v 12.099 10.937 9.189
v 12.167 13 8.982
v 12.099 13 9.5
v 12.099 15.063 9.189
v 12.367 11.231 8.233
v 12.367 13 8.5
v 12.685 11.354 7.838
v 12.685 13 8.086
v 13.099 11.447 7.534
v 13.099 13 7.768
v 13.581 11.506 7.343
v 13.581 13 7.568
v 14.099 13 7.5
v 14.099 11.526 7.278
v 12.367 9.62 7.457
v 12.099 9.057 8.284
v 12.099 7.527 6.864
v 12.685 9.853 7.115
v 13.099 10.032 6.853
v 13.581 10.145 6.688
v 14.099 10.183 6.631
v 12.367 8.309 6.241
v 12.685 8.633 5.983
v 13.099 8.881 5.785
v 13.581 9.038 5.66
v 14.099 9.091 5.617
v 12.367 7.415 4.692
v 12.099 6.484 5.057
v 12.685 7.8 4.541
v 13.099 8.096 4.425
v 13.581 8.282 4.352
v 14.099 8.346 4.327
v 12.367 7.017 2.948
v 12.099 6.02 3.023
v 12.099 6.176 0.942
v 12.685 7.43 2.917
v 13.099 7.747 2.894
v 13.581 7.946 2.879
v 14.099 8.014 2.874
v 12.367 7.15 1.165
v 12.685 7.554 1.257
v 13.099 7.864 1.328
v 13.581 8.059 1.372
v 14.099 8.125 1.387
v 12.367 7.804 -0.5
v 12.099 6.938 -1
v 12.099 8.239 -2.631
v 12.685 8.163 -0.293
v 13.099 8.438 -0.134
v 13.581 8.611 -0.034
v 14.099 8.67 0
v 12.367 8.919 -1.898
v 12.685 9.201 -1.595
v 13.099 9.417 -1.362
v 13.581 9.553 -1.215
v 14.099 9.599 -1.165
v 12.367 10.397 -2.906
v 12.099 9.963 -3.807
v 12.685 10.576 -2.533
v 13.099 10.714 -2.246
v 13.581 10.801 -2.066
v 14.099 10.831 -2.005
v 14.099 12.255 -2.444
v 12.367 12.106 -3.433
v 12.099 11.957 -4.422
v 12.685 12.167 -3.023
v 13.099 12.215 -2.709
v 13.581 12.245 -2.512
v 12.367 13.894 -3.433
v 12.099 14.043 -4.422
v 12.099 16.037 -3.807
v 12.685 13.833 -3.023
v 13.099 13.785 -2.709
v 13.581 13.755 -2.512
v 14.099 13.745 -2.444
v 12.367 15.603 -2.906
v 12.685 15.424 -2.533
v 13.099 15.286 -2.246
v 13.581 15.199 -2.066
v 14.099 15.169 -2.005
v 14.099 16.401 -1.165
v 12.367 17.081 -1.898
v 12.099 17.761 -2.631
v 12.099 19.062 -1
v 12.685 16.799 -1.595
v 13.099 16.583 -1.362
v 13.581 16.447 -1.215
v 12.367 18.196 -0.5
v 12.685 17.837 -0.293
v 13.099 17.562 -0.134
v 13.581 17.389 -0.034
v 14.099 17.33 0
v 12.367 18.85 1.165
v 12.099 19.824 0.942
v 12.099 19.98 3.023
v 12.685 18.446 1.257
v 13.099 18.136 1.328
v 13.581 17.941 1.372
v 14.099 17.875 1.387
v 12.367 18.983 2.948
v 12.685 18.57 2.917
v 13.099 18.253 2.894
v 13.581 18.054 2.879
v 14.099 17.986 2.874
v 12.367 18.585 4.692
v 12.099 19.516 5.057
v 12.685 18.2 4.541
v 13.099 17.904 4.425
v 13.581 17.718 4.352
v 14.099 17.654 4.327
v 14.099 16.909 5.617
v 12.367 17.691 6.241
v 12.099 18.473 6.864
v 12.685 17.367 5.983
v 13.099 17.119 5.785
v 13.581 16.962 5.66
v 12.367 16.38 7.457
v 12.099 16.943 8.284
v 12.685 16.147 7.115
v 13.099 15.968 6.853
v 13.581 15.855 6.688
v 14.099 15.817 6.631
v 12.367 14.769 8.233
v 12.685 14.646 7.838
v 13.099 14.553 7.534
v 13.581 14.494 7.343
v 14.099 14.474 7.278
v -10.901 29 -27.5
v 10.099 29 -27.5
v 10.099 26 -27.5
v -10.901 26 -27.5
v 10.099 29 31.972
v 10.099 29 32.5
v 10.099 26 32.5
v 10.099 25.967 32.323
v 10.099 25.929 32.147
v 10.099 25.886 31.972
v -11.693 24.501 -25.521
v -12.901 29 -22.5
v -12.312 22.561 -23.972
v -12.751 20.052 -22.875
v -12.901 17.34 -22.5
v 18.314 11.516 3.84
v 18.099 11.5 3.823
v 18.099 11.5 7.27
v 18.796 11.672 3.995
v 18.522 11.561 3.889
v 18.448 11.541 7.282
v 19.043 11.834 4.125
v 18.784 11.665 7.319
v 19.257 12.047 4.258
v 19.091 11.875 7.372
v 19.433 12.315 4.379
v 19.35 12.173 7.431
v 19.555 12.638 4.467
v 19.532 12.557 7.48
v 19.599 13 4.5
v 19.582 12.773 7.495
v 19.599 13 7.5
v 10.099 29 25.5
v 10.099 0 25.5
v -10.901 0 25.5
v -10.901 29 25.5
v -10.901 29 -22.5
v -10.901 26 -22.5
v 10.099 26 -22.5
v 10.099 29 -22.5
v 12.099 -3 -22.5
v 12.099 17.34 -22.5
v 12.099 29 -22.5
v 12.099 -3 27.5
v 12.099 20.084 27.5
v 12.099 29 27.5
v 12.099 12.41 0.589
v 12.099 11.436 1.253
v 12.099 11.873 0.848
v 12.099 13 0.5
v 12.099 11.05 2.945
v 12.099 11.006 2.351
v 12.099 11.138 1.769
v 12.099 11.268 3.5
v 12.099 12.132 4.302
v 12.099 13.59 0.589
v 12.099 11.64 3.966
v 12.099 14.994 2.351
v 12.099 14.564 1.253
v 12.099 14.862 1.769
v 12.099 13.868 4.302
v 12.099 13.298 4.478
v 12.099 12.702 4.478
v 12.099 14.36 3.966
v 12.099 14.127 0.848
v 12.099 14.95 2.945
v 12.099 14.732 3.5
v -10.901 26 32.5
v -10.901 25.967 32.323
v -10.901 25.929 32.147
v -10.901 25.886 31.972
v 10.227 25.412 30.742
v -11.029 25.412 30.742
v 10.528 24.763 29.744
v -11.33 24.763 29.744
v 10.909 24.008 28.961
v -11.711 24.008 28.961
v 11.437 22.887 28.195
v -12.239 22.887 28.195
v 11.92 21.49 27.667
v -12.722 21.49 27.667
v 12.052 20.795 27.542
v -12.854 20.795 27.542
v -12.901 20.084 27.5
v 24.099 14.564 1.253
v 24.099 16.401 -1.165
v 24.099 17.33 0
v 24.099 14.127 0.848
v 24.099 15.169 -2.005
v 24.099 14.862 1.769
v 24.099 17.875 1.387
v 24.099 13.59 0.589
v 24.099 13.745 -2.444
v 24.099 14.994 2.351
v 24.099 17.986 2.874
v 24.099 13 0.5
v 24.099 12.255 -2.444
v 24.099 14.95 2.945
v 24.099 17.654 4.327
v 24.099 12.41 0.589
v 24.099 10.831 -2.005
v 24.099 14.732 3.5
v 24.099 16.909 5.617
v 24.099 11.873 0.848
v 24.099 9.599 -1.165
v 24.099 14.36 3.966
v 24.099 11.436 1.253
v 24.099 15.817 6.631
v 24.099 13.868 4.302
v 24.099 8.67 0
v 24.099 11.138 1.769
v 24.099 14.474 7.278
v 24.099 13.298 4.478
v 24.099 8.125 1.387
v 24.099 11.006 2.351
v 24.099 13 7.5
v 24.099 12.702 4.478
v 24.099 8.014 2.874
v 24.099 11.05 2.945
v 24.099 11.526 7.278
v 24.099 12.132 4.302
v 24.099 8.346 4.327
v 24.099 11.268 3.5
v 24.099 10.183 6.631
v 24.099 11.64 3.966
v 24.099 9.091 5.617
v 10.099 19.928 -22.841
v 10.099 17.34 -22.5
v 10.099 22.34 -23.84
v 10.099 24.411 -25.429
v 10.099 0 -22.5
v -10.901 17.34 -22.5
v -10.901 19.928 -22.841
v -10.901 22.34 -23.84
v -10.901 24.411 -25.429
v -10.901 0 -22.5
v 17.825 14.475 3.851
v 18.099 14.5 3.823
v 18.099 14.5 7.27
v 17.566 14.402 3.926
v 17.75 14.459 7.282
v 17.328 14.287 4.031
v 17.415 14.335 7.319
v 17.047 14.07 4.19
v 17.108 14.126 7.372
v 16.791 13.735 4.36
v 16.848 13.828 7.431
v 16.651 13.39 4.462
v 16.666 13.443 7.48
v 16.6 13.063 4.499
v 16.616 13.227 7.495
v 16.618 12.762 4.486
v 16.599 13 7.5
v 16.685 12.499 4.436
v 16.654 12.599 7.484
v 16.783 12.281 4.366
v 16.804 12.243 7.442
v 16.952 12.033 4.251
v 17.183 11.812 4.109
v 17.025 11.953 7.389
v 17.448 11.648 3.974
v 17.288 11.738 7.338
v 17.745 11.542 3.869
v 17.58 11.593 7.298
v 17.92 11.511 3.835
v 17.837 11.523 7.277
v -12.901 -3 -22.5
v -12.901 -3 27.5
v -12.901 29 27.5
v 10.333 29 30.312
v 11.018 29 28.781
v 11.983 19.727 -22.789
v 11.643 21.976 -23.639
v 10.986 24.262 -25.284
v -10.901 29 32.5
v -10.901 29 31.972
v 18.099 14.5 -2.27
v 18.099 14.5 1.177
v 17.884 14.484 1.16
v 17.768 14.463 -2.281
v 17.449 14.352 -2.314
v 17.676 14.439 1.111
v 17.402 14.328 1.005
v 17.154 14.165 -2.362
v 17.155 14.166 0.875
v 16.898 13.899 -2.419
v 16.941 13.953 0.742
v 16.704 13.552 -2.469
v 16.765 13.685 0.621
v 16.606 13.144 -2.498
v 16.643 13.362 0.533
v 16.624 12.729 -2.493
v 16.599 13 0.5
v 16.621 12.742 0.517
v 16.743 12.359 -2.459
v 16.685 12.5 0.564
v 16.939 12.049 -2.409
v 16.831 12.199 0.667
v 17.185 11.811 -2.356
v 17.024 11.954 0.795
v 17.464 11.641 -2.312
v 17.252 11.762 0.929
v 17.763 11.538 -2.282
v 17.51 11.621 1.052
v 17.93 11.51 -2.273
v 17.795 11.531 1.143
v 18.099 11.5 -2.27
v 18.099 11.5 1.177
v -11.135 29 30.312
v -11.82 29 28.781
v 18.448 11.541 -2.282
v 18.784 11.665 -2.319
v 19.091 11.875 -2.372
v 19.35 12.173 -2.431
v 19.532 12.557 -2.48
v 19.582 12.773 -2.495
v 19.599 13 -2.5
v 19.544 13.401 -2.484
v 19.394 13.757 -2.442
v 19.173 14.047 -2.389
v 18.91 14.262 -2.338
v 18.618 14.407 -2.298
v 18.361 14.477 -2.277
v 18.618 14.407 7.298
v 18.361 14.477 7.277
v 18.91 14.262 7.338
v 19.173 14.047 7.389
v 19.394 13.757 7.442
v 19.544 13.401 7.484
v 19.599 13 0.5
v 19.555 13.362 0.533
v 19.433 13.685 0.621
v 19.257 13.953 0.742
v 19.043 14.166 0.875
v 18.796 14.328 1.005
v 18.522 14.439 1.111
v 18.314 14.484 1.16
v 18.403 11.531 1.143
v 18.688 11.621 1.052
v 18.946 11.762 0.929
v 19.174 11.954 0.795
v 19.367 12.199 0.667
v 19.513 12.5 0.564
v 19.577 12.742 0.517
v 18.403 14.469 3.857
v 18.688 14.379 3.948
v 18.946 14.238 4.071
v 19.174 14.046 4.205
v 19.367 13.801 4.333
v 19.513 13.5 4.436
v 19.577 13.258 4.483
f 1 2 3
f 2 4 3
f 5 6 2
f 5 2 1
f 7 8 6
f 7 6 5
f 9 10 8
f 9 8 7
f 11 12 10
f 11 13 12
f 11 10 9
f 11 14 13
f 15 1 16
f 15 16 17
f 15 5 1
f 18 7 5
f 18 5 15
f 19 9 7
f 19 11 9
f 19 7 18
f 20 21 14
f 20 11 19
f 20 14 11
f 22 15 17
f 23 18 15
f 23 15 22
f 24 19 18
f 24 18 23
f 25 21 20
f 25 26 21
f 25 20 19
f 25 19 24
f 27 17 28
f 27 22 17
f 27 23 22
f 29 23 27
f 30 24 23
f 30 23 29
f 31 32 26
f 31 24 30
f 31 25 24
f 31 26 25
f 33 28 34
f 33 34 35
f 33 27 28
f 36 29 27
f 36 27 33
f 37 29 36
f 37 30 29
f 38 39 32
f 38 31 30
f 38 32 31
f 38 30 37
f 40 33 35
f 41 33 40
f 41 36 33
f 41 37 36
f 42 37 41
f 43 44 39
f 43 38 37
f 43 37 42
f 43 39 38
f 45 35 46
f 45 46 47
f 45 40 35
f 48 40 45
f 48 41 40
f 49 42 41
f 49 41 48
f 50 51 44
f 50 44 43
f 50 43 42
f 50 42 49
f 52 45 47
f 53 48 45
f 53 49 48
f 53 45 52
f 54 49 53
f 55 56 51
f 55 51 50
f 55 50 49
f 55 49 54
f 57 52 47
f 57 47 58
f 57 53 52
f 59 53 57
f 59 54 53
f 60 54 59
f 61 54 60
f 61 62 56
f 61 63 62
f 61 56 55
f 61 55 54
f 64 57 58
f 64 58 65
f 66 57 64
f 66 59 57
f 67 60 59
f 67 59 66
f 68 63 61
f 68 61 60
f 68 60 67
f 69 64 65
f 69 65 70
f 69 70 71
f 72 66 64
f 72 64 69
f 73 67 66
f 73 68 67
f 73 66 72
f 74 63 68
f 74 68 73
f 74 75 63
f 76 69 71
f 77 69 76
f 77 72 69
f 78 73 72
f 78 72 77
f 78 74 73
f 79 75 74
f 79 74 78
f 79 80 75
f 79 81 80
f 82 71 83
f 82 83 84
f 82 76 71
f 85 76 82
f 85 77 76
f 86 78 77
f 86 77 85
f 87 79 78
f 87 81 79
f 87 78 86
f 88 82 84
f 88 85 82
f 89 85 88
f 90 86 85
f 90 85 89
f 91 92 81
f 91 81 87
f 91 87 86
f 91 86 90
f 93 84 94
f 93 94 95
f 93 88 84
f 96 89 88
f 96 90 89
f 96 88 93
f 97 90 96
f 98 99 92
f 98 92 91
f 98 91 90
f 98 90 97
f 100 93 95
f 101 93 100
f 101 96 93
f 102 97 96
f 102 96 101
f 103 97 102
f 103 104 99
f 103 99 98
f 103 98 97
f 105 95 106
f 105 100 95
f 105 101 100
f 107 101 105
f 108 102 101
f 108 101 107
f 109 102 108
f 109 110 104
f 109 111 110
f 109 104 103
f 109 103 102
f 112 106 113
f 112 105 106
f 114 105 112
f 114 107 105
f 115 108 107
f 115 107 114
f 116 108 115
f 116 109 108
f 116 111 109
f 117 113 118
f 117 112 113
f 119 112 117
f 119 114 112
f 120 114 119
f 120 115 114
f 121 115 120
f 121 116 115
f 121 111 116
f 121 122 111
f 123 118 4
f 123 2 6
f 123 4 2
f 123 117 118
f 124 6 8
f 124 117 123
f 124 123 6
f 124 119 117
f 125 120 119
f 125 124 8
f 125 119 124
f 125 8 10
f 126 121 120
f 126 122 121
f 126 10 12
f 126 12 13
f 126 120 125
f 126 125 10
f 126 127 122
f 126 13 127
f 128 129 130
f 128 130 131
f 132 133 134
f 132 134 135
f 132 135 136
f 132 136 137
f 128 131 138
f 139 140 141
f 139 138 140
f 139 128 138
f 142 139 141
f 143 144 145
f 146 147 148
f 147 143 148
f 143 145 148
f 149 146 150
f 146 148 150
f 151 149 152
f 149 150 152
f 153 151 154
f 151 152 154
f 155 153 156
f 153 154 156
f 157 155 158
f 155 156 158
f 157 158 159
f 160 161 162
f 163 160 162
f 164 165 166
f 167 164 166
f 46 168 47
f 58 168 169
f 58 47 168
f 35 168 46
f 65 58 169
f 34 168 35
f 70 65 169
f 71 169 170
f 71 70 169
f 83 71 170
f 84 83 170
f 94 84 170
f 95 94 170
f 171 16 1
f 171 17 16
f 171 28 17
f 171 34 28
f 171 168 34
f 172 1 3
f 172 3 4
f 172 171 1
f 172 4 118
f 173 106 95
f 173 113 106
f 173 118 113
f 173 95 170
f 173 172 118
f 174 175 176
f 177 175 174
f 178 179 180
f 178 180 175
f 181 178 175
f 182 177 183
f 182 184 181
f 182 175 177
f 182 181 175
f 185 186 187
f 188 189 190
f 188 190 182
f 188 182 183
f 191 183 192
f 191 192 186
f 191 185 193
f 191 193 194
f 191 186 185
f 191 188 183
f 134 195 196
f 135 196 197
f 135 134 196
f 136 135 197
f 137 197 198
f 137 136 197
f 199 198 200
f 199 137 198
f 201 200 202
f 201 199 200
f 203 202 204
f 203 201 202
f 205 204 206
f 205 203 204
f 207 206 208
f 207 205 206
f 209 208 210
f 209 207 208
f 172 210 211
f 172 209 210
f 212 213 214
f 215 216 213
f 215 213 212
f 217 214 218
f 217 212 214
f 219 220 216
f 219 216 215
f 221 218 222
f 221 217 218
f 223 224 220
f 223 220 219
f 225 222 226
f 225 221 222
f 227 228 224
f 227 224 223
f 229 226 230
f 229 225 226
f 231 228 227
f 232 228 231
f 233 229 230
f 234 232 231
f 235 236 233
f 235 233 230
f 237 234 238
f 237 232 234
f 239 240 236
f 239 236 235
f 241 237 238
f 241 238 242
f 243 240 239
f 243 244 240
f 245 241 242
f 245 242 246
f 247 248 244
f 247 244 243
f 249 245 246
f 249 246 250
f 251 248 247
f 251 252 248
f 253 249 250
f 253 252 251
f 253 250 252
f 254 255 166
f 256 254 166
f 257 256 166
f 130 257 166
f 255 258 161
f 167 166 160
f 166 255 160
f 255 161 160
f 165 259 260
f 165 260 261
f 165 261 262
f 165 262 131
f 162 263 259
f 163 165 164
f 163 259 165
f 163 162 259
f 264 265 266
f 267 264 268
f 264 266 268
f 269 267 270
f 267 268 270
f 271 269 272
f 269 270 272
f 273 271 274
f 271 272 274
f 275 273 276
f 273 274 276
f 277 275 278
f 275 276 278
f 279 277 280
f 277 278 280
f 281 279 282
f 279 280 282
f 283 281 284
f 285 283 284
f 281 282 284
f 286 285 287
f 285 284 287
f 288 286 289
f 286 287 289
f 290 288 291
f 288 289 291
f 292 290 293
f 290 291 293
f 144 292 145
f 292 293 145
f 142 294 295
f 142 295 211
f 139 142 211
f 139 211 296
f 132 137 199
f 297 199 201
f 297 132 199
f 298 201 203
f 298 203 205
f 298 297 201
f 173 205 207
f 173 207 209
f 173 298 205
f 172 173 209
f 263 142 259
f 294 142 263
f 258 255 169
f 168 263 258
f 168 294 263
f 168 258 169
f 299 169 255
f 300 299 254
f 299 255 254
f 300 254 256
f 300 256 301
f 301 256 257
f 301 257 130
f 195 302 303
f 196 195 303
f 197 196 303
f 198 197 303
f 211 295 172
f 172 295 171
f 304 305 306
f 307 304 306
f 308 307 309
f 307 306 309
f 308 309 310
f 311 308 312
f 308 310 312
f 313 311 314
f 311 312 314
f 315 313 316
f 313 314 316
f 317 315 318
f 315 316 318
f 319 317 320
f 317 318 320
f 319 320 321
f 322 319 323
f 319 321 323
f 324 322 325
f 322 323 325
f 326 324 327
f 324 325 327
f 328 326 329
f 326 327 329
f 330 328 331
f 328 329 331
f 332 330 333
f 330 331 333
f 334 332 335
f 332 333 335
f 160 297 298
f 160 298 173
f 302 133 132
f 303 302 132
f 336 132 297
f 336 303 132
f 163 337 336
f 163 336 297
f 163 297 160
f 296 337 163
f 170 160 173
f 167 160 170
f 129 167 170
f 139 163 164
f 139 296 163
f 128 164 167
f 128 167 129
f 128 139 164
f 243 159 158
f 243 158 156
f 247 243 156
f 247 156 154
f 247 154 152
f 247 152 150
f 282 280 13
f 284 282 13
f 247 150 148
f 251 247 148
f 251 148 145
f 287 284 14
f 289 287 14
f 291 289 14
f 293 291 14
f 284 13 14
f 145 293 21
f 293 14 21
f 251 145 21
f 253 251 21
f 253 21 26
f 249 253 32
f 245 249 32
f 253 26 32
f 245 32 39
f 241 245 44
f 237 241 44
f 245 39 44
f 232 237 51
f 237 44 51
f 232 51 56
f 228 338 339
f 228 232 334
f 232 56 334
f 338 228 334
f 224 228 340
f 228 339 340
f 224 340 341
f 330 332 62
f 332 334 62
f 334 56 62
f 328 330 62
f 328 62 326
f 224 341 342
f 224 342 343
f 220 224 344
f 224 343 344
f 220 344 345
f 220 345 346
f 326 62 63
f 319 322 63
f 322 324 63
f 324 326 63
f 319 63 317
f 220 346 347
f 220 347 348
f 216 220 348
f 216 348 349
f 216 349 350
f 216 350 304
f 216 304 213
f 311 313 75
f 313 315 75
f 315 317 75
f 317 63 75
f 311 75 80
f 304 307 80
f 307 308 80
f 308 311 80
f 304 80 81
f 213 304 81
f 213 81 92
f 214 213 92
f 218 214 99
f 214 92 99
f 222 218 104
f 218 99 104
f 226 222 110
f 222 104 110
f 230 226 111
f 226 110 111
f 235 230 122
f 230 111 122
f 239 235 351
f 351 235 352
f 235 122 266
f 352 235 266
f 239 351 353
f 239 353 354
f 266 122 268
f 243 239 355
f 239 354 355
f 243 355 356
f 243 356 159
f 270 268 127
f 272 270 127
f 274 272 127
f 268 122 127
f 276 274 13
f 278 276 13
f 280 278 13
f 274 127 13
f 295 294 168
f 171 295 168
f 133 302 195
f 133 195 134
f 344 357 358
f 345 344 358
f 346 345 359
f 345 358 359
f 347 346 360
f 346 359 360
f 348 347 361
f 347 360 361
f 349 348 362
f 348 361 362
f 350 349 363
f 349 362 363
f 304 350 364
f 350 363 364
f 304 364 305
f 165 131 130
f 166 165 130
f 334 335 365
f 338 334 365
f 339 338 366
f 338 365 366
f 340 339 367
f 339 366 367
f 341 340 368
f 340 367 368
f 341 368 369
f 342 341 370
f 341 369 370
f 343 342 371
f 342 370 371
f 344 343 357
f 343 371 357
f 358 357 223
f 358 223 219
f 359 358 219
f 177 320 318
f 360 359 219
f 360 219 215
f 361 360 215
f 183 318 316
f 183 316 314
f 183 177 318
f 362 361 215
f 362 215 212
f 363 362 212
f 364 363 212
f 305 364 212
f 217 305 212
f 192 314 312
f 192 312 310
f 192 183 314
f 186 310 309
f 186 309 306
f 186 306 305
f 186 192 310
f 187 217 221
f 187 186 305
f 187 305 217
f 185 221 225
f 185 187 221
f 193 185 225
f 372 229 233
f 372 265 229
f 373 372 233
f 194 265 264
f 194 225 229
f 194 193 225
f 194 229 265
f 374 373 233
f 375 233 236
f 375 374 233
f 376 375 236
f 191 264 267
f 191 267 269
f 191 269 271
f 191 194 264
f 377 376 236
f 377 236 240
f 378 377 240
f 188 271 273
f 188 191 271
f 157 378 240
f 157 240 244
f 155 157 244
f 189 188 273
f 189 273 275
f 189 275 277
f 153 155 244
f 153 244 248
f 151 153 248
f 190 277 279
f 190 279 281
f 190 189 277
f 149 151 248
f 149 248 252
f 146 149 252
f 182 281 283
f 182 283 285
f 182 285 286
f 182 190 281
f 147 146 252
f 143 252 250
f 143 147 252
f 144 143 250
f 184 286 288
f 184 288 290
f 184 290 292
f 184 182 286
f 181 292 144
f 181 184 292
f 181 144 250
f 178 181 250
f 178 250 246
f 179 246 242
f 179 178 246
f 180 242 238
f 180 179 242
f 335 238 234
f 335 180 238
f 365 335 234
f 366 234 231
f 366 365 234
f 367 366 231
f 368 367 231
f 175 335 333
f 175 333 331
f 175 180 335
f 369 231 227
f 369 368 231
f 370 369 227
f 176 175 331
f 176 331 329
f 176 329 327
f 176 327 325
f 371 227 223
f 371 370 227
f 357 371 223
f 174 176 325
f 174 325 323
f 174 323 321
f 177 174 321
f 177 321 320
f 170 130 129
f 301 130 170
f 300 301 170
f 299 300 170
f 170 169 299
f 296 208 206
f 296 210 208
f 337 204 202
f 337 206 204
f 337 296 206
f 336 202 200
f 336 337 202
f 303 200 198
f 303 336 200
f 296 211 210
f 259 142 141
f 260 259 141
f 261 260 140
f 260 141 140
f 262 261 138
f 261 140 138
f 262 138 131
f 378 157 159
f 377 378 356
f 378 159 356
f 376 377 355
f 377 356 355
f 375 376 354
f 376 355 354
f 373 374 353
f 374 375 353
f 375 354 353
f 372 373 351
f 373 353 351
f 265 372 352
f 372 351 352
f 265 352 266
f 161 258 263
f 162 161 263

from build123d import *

# Parameters (mm, degrees)
BOSS_EXTRUDE1_DEPTH      = 29
BOSS_EXTRUDE1_DEPTH_BACK = 3
SKETCH1_W                = 25
SKETCH1_H                = 50
BOSS_EXTRUDE2_DEPTH      = 3
BOSS_EXTRUDE3_START      = 29
SKETCH1_4_W              = 21
SKETCH1_4_H              = 5
BOSS_EXTRUDE3_DEPTH      = 3
CUT_EXTRUDE1_DEPTH       = 29
FILLET1_START            = -12.900995056
FILLET1_DEPTH            = 2
FILLET1_START_2          = 10.099004944
FILLET1_2_DEPTH          = 2
FILLET1_START_3          = 16
FILLET1_3_DEPTH          = 10
FILLET2_R                = 6
SKETCH2_R                = 5
SKETCH2_R_2              = 2
BOSS_EXTRUDE4_DEPTH      = 12
CUT_EXTRUDE3_DEPTH       = 30
FILLET5_R                = 2


with BuildPart() as part:
    # Sketch1 → Boss-Extrude1 (new, two sides: drawn at the far end of the back side and taken through both)
    with BuildSketch(Plane(origin=(0, 0, 0), x_dir=(1, 0, 0), z_dir=(0, 1, 0)).offset(-BOSS_EXTRUDE1_DEPTH_BACK)):
        with Locations((-0.400995056, -2.5)):
            Rectangle(SKETCH1_W, SKETCH1_H)
    extrude(amount=BOSS_EXTRUDE1_DEPTH + BOSS_EXTRUDE1_DEPTH_BACK)

    # Sketch1<3> → Boss-Extrude2 (add)
    with BuildSketch(Plane(origin=(0, 0, 0), x_dir=(1, 0, 0), z_dir=(0, 1, 0))):
        Polygon((-10.900995056, 22.5), (-10.900995056, 20.5), (-10.900995056, -25.5), (10.099004944, -25.5), (10.099004944, 20.5), (10.099004944, 22.5), align=None)
    extrude(amount=-BOSS_EXTRUDE2_DEPTH)

    # Sketch1<4> → Boss-Extrude3 (add)
    with BuildSketch(Plane(origin=(0, 0, 0), x_dir=(1, 0, 0), z_dir=(0, 1, 0)).offset(BOSS_EXTRUDE3_START)):
        Polygon((-12.900995056, 22.5), (12.099004944, 22.5), (10.099004944, 27.5), (-10.900995056, 27.5), align=None)
        with Locations((-0.400995056, -30)):
            Rectangle(SKETCH1_4_W, SKETCH1_4_H)
    extrude(amount=-BOSS_EXTRUDE3_DEPTH)

    # Sketch1<5> → Cut-Extrude1 (cut)
    with BuildSketch(Plane(origin=(0, 0, 0), x_dir=(1, 0, 0), z_dir=(0, 1, 0))):
        Polygon((-10.900995056, 22.5), (10.099004944, 22.5), (10.099004944, 20.5), (10.099004944, -25.5), (-10.900995056, -25.5), (-10.900995056, 20.5), align=None)
    extrude(amount=CUT_EXTRUDE1_DEPTH, mode=Mode.SUBTRACT)

    # Fillet1: read off the stored shape, not the designer's step
    # Fillet1 outline → Fillet1 (add)
    with BuildSketch(Plane.YZ.offset(FILLET1_START)):
        with BuildLine():
            ThreePointArc((17.339745962, -22.5), (22.339745962, -23.839745962), (26, -27.5))
            Line((26, -27.5), (26, -22.5))
            Line((26, -22.5), (17.339745962, -22.5))
        make_face()
    extrude(amount=FILLET1_DEPTH)

    # Fillet1 2 outline → Fillet1 2 (add)
    with BuildSketch(Plane.YZ.offset(FILLET1_START_2)):
        with BuildLine():
            ThreePointArc((17.339745962, -22.5), (22.339745962, -23.839745962), (26, -27.5))
            Line((26, -27.5), (26, -22.5))
            Line((26, -22.5), (17.339745962, -22.5))
        make_face()
    extrude(amount=FILLET1_2_DEPTH)

    # Fillet1 3 outline → Fillet1 3 (cut)
    with BuildSketch(Plane(origin=(0, 0, 0), x_dir=(1, 0, 0), z_dir=(0, 1, 0)).offset(FILLET1_START_3)):
        Polygon((-13.500995056, 21), (-10.300995056, 29), (-14, 29), (-14, 21), align=None)
        Polygon((14, 29), (9.499004944, 29), (12.699004944, 21), (14, 21), align=None)
    extrude(amount=FILLET1_3_DEPTH, mode=Mode.SUBTRACT)

    # Fillet2
    # the kernel refuses this fillet: 6 mm, written as the material it adds along each edge
    with BuildSketch(Plane(origin=(10.099004944, 26, 27.5), x_dir=(0, 0, 1), z_dir=(-1, 0, 0))) as fillet2_piece_1:
        with BuildLine():
            CenterArc((6, -5.916079783), FILLET2_R, 99.594068227, 80.405931773)
            Line((0, -5.916079783), (0, 0))
            Line((0, 0), (5, 0))
        make_face()
    extrude(amount=21)
    with BuildSketch(Plane(origin=(10.099004944, 29, 27.5), x_dir=(0, 0, 1), z_dir=(0, -1, 0))) as fillet2_piece_2:
        with BuildLine():
            CenterArc((4.472135955, -6), FILLET2_R, 90, 48.189685104)
            Line((0, -2), (0, 0))
            Line((0, 0), (4.472135955, 0))
        make_face()
    extrude(amount=3)
    with BuildSketch(Plane(origin=(-10.900995056, 29, 27.5), x_dir=(0, 0, 1), z_dir=(0, -1, 0))) as fillet2_piece_3:
        with BuildLine():
            CenterArc((4.472135955, 6), FILLET2_R, 221.810314896, 48.189685104)
            Line((0, 2), (0, 0))
            Line((0, 0), (4.472135955, 0))
        make_face()
    extrude(amount=3)
    with BuildSketch(Plane(origin=(24.889204401, 26, 27.5), x_dir=(0, 0, 1), z_dir=(-1, 0, 0))) as fillet2_piece_4a_section:
        with BuildLine():
            CenterArc((6, -5.916079783), FILLET2_R, 99.594068227, 80.405931773)
            Line((0, -5.916079783), (0, 0))
            Line((0, 0), (5, 0))
        make_face()
    fillet2_piece_4a = extrude(amount=35.790199458, mode=Mode.PRIVATE)
    fillet2_piece_4a = split(fillet2_piece_4a, bisect_by=Plane(origin=(12.099004944, 26, 27.5), z_dir=(-1, 0, 0)), keep=Keep.TOP, mode=Mode.PRIVATE)
    fillet2_piece_4a = split(fillet2_piece_4a, bisect_by=Plane(origin=(10.099004944, 26, 27.5), z_dir=(1, 0, 0)), keep=Keep.TOP, mode=Mode.PRIVATE)
    with BuildSketch(Plane(origin=(10.099004944, 29, 27.5), x_dir=(0, 0, 1), z_dir=(0, -1, 0))) as fillet2_piece_4b_section:
        with BuildLine():
            CenterArc((4.472135955, -6), FILLET2_R, 90, 48.189685104)
            Line((0, -2), (0, 0))
            Line((0, 0), (4.472135955, 0))
        make_face()
    fillet2_piece_4b = extrude(amount=14.180339887, mode=Mode.PRIVATE)
    fillet2_piece_4b = split(fillet2_piece_4b, bisect_by=Plane(origin=(10.099004944, 26, 27.5), z_dir=(0, -1, 0)), keep=Keep.TOP, mode=Mode.PRIVATE)
    fillet2_piece_4 = fillet2_piece_4a & fillet2_piece_4b
    add(fillet2_piece_4)
    with BuildSketch(Plane(origin=(-10.900995056, 29, 27.5), x_dir=(0, 0, 1), z_dir=(0, -1, 0))) as fillet2_piece_5a_section:
        with BuildLine():
            CenterArc((4.472135955, 6), FILLET2_R, 221.810314896, 48.189685104)
            Line((0, 2), (0, 0))
            Line((0, 0), (4.472135955, 0))
        make_face()
    fillet2_piece_5a = extrude(amount=14.180339887, mode=Mode.PRIVATE)
    fillet2_piece_5a = split(fillet2_piece_5a, bisect_by=Plane(origin=(-10.900995056, 26, 27.5), z_dir=(0, -1, 0)), keep=Keep.TOP, mode=Mode.PRIVATE)
    with BuildSketch(Plane(origin=(10.099004944, 26, 27.5), x_dir=(0, 0, 1), z_dir=(-1, 0, 0))) as fillet2_piece_5b_section:
        with BuildLine():
            CenterArc((6, -5.916079783), FILLET2_R, 99.594068227, 80.405931773)
            Line((0, -5.916079783), (0, 0))
            Line((0, 0), (5, 0))
        make_face()
    fillet2_piece_5b = extrude(amount=35.790199458, mode=Mode.PRIVATE)
    fillet2_piece_5b = split(fillet2_piece_5b, bisect_by=Plane(origin=(-12.900995056, 26, 27.5), z_dir=(1, 0, 0)), keep=Keep.TOP, mode=Mode.PRIVATE)
    fillet2_piece_5b = split(fillet2_piece_5b, bisect_by=Plane(origin=(-10.900995056, 26, 27.5), z_dir=(-1, 0, 0)), keep=Keep.TOP, mode=Mode.PRIVATE)
    fillet2_piece_5 = fillet2_piece_5a & fillet2_piece_5b
    add(fillet2_piece_5)

    # Sketch2 → Boss-Extrude4 (add)
    with BuildSketch(Plane(origin=(12.099004944, 0, 0), x_dir=(0, 0, -1), z_dir=(1, 0, 0))):
        with Locations(Location((-2.5, 13, 0), (0, 0, 180))):
            Circle(SKETCH2_R)
        with Locations((-2.5, 13)):
            Circle(SKETCH2_R_2, mode=Mode.SUBTRACT)
    extrude(amount=BOSS_EXTRUDE4_DEPTH)

    # Sketch3 → Cut-Extrude3 (cut)
    with BuildSketch(Plane.XY.offset(27.5)):
        with BuildLine():
            ThreePointArc((19.599004944, 13), (19.159665115, 14.060660172), (18.099004944, 14.5))
            Line((18.099004944, 14.5), (18.099004944, 11.5))
            ThreePointArc((18.099004944, 11.5), (19.159665115, 11.939339828), (19.599004944, 13))
        make_face()
        with BuildLine():
            Line((18.099004944, 11.5), (18.099004944, 14.5))
            ThreePointArc((18.099004944, 14.5), (16.599004944, 13), (18.099004944, 11.5))
        make_face()
    extrude(amount=-CUT_EXTRUDE3_DEPTH, mode=Mode.SUBTRACT)

    # Fillet5
    fillet5_edges = [part.edges().sort_by_distance(p)[0] for p in [
        (12.099004944, 13, -2.5),
    ]]
    fillet(fillet5_edges, radius=FILLET5_R)


solid = part.part
